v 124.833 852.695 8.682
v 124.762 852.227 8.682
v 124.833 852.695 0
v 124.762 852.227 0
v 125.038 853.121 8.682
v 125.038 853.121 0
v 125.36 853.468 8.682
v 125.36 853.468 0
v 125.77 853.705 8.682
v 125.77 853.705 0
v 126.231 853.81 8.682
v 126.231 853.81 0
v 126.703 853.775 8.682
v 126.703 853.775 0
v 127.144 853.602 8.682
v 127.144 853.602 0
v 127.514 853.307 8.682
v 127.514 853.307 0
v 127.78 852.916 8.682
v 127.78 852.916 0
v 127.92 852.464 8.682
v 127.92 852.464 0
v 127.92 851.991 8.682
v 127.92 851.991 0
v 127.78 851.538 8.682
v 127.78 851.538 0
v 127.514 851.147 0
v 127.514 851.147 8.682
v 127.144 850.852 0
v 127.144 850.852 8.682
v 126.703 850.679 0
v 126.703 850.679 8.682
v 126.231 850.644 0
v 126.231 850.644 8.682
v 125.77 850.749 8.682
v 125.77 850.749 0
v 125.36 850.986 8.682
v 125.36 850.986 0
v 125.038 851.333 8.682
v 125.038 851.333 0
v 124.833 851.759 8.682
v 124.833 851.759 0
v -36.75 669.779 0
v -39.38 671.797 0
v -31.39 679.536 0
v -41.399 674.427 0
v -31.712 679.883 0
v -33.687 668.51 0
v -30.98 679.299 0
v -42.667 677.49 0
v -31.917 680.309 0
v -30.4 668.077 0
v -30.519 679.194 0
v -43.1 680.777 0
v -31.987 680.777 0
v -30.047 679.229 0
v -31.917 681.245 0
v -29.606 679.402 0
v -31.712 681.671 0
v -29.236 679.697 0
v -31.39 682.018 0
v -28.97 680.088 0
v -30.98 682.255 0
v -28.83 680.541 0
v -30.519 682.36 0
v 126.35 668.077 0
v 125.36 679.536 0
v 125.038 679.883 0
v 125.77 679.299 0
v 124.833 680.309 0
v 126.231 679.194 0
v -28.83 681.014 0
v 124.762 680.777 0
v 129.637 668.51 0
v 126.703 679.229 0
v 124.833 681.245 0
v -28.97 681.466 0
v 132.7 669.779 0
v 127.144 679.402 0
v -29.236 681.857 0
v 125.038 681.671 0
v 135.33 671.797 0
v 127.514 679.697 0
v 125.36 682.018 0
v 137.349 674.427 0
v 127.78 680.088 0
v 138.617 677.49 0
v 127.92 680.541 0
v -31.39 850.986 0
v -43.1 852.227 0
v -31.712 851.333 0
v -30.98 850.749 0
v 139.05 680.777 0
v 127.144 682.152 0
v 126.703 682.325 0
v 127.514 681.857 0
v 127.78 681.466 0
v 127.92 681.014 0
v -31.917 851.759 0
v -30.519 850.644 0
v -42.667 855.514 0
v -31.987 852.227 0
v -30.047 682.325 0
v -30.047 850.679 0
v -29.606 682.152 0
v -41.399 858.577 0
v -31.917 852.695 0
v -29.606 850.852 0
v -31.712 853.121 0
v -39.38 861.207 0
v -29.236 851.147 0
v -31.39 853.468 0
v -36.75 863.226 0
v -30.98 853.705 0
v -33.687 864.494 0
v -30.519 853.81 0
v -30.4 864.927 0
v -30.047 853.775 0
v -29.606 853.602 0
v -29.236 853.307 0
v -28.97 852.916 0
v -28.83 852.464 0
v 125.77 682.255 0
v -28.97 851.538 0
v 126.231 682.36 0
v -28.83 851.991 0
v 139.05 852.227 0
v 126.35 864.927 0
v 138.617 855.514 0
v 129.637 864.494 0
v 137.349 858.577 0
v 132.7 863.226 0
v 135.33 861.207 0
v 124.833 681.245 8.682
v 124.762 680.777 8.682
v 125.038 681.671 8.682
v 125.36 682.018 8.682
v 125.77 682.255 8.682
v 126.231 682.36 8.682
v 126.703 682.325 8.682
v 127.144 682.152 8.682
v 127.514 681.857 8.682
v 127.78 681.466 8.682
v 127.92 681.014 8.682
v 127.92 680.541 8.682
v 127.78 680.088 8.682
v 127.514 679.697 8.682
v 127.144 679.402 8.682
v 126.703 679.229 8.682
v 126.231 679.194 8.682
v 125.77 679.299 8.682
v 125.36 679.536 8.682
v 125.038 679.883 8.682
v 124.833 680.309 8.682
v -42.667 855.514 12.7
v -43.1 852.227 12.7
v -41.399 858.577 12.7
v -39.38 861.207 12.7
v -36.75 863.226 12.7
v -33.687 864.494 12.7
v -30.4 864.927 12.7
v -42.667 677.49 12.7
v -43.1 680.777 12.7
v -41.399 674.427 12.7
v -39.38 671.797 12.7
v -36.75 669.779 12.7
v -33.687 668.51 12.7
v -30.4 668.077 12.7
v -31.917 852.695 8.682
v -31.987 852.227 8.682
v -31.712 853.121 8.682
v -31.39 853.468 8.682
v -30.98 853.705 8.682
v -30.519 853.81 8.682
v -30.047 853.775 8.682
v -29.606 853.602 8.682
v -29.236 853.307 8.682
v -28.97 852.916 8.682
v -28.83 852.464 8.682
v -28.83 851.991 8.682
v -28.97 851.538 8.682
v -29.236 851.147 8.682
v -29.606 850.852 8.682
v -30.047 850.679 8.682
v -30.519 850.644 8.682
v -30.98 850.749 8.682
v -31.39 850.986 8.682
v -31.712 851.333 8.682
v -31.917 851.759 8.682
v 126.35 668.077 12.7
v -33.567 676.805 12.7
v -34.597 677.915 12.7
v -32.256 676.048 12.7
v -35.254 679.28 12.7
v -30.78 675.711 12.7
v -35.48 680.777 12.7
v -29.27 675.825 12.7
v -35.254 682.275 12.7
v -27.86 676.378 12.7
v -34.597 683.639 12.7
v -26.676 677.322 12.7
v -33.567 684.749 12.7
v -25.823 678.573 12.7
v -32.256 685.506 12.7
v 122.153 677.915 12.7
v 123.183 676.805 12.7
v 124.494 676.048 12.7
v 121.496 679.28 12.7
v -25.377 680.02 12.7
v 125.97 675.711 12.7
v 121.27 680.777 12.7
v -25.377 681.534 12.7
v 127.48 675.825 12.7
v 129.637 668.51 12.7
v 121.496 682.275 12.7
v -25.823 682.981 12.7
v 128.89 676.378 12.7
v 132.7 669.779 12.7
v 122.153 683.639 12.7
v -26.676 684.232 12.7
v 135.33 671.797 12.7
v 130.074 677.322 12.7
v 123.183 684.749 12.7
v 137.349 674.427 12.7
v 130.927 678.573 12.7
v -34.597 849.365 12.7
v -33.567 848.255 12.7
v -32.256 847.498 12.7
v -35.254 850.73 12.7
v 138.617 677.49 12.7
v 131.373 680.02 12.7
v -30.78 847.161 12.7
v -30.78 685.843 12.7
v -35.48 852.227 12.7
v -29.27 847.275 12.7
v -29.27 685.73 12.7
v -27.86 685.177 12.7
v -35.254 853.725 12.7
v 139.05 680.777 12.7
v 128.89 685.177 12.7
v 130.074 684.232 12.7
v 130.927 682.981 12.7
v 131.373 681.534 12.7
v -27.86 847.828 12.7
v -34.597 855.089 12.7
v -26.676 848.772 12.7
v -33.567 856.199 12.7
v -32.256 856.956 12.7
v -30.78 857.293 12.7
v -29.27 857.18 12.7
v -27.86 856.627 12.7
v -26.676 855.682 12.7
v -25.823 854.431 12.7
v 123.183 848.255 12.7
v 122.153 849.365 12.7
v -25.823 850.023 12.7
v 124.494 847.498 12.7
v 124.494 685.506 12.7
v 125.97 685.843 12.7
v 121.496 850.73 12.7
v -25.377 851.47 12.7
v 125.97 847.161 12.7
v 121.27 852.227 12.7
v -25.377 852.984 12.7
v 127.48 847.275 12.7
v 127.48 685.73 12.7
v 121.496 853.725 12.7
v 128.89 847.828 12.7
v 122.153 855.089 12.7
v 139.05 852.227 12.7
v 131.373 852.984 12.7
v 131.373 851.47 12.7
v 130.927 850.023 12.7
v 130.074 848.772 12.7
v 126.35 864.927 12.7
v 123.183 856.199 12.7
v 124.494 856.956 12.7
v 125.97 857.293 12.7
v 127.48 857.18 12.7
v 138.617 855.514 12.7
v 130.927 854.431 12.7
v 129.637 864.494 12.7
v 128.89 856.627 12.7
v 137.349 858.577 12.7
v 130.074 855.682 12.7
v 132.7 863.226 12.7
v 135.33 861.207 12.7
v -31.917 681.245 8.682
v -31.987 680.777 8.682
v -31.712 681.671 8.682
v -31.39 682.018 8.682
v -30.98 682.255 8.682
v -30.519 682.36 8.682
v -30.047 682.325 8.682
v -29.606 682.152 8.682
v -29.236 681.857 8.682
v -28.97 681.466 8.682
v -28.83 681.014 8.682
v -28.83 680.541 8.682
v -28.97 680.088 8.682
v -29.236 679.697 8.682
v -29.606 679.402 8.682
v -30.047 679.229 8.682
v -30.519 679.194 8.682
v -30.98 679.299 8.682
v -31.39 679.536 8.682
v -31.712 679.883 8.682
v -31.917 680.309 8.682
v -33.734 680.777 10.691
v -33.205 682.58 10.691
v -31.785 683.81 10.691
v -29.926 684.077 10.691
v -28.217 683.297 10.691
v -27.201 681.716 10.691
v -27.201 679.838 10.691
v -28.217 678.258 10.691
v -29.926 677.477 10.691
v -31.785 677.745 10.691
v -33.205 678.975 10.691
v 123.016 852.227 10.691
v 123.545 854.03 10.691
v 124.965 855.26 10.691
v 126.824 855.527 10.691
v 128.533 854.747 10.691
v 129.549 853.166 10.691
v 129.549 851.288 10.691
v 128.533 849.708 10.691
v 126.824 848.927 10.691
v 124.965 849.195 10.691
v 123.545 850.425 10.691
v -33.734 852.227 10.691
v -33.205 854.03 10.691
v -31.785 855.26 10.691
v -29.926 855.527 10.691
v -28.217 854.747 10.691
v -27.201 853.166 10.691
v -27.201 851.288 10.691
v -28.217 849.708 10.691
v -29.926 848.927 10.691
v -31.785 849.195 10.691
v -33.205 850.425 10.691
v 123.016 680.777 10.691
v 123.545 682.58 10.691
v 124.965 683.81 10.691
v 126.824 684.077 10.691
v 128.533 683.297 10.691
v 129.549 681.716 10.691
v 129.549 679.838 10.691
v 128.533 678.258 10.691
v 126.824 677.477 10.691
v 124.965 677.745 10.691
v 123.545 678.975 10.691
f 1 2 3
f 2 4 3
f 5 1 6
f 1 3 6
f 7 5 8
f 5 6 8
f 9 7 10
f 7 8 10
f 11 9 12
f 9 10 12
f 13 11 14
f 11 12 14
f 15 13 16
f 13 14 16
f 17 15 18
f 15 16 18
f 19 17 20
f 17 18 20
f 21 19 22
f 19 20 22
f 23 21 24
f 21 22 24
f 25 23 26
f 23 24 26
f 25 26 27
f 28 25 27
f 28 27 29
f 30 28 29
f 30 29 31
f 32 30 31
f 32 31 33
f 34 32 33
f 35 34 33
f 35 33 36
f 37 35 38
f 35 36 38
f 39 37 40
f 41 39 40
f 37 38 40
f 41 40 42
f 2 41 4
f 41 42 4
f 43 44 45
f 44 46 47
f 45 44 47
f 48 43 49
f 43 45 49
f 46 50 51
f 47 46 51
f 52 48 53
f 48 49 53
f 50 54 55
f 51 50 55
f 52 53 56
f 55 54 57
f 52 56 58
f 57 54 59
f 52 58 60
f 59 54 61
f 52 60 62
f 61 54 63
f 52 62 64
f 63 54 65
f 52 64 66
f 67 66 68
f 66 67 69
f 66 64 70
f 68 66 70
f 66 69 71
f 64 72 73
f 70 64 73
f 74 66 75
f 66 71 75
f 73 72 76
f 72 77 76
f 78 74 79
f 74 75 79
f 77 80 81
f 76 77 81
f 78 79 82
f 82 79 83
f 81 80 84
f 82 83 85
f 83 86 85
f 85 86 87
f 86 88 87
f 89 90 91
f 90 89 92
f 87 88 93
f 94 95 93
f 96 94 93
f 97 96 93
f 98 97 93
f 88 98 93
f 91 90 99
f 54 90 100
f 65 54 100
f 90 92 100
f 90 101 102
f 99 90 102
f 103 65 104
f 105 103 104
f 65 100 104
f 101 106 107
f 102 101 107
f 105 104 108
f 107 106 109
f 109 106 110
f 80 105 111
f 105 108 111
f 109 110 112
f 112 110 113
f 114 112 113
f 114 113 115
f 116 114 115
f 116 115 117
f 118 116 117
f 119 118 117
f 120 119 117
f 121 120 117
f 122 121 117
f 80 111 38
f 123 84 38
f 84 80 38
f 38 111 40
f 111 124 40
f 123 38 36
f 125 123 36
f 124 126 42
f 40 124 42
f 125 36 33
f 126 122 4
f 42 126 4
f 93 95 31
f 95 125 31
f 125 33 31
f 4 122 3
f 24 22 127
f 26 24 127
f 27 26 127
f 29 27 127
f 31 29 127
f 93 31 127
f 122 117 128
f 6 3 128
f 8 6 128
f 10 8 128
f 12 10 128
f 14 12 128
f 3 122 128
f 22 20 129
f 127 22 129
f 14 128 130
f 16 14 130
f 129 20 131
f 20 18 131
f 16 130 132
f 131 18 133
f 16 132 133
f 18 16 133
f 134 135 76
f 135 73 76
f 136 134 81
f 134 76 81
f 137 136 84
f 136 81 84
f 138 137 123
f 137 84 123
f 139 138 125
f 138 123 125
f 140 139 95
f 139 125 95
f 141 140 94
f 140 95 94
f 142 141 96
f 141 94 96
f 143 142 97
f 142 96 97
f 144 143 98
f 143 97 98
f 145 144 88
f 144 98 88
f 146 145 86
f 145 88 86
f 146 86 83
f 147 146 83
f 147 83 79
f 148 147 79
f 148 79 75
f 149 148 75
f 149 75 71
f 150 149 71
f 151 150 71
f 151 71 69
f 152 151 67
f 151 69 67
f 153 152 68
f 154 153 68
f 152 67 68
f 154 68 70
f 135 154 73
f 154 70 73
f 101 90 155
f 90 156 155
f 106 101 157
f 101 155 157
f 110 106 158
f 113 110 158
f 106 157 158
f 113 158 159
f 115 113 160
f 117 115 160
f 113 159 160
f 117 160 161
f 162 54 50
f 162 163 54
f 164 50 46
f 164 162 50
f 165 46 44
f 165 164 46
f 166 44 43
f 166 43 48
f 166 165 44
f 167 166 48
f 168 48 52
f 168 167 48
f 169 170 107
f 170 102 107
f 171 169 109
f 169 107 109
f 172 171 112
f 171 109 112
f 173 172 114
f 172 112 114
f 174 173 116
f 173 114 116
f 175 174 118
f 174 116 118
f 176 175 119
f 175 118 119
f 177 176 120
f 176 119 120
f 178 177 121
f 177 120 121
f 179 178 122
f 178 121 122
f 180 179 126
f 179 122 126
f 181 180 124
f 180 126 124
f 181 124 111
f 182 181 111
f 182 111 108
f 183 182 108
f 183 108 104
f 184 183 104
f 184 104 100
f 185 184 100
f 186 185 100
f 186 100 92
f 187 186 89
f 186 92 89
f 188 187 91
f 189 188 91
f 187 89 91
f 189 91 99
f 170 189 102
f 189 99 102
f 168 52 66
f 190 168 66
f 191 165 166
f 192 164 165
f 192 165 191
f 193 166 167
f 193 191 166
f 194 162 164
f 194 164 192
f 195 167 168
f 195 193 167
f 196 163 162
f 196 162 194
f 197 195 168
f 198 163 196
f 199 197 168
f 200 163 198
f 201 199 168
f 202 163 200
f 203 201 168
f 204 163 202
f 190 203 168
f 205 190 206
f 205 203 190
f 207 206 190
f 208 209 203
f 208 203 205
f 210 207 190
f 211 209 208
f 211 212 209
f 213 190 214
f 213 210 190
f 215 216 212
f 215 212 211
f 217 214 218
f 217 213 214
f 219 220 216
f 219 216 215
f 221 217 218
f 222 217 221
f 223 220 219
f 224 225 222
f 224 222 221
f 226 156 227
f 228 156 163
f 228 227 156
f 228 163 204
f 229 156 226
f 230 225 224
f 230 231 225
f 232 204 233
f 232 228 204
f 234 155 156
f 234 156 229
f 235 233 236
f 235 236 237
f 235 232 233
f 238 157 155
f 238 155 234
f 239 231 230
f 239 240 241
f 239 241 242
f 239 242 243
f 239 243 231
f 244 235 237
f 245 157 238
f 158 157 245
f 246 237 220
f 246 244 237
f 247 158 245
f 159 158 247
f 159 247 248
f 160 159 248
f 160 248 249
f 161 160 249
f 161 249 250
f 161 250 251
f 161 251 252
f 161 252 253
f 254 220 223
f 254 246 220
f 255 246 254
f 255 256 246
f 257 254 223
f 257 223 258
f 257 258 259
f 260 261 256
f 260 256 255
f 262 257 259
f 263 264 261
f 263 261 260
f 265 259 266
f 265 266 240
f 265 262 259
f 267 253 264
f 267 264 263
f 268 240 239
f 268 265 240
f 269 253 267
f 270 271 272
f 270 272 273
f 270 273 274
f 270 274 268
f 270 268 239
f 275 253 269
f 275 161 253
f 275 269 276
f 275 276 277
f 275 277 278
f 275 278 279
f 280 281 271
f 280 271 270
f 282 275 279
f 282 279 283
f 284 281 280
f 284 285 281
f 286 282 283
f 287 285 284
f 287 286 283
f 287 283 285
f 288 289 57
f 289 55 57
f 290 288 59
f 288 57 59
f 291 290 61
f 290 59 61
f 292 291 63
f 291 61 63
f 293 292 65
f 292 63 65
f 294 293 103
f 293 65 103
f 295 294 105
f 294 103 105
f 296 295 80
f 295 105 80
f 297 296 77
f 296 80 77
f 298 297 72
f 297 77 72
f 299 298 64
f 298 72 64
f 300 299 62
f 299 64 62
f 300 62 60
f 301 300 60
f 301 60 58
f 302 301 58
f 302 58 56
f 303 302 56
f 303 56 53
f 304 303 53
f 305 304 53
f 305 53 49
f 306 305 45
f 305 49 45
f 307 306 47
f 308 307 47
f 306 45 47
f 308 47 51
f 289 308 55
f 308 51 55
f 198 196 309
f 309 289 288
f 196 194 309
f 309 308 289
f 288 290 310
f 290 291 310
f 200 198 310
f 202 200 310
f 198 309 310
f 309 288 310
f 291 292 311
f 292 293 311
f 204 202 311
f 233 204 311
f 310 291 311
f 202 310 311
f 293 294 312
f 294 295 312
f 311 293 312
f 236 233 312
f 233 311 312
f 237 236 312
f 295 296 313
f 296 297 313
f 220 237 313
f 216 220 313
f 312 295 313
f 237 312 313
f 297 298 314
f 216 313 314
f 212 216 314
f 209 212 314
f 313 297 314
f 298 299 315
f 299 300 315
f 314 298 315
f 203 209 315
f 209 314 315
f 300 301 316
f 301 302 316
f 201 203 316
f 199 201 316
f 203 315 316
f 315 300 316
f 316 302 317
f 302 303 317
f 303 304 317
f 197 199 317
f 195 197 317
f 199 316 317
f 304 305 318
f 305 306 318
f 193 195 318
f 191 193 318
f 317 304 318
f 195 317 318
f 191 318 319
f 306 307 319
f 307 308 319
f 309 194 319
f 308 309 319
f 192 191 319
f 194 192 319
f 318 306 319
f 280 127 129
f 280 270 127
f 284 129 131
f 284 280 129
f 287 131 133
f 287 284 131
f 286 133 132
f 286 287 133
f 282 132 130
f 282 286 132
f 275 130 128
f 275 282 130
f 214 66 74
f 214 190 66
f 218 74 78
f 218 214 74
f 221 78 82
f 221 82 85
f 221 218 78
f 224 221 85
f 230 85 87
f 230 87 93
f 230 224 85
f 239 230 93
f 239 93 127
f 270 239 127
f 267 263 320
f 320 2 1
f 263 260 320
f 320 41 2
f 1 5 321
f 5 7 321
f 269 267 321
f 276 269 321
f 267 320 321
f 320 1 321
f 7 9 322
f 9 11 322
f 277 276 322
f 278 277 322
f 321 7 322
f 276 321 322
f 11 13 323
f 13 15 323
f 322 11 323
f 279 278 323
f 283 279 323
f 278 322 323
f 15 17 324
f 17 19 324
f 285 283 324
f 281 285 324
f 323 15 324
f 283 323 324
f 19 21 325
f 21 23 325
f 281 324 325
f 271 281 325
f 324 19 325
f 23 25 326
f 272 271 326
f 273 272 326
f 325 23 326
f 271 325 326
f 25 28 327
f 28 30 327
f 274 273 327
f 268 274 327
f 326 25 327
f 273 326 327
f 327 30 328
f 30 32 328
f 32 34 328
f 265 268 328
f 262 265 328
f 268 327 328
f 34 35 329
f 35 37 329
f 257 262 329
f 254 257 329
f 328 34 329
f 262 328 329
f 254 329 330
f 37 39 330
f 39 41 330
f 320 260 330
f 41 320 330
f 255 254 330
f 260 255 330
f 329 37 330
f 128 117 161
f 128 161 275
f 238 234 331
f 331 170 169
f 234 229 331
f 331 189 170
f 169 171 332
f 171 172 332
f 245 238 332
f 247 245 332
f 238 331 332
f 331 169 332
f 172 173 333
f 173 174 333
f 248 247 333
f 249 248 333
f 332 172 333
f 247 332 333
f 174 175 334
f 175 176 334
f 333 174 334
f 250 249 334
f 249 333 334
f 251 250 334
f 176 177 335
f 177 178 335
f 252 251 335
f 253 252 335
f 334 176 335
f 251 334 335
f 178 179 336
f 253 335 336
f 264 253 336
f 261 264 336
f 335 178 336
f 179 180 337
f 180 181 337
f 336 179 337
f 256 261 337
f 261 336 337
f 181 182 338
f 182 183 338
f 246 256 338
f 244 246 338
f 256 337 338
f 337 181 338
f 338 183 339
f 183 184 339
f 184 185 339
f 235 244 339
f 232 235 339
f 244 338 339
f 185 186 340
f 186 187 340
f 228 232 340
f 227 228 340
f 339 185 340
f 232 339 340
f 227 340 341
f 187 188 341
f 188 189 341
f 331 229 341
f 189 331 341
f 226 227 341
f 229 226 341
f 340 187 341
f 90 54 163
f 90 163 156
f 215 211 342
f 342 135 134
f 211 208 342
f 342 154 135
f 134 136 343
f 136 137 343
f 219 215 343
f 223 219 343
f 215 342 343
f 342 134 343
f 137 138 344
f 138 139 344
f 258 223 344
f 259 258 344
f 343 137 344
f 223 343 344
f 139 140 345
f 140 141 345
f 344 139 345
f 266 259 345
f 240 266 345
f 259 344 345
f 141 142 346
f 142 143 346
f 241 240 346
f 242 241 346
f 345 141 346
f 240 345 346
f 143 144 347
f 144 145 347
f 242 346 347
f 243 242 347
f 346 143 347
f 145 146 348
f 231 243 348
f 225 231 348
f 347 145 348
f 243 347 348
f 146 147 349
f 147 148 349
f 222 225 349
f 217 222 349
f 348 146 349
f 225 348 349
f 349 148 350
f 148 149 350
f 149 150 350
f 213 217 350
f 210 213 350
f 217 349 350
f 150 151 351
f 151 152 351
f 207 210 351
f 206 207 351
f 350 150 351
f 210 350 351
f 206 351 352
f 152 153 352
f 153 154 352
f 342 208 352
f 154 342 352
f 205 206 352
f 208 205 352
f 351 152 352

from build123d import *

# Parameters (mm, degrees)
SKETCH1_W           = 182.149999994
SKETCH1_H           = 196.85
BOSS_EXTRUDE1_DEPTH = 12.7
FILLET1_R           = 12.7
HOLE1_D             = 3.175
HOLE1_DEPTH         = 31.75
HOLE1_CSINK_D       = 10.16
HOLE1_CSINK_ANGLE   = 82
HOLE1_TIP           = 0.953866233


with BuildPart() as part:
    # Sketch1 → Boss-Extrude1 (new body)
    with BuildSketch(Plane.XY):
        with Locations((47.975000003, 766.50216301)):
            Rectangle(SKETCH1_W, SKETCH1_H)
    extrude(amount=BOSS_EXTRUDE1_DEPTH)

    # Fillet1
    fillet1_edges = [part.edges().sort_by_distance(p)[0] for p in [
        (-43.099999994, 668.07716301, 6.35),
        (-43.099999994, 864.92716301, 6.35),
        (139.05, 864.92716301, 6.35),
        (139.05, 668.07716301, 6.35),
    ]]
    fillet(fillet1_edges, radius=FILLET1_R)

    # Hole1
    with Locations(Plane(origin=(47.975000003, -457.960607328, 12.7), x_dir=(1, 0, 0), z_dir=(0, 0, 1))):
        with Locations((-78.374999997, 1310.187770337), (-78.374999997, 1138.737770337), (78.374999997, 1138.737770337), (78.374999997, 1310.187770337)):
            CounterSinkHole(HOLE1_D / 2, HOLE1_CSINK_D / 2, depth=HOLE1_DEPTH, counter_sink_angle=HOLE1_CSINK_ANGLE)
            with Locations((0, 0, -(HOLE1_DEPTH + HOLE1_TIP / 2))):  # 118° drill point
                Cone(0, HOLE1_D / 2, HOLE1_TIP, mode=Mode.SUBTRACT)


solid = part.part
